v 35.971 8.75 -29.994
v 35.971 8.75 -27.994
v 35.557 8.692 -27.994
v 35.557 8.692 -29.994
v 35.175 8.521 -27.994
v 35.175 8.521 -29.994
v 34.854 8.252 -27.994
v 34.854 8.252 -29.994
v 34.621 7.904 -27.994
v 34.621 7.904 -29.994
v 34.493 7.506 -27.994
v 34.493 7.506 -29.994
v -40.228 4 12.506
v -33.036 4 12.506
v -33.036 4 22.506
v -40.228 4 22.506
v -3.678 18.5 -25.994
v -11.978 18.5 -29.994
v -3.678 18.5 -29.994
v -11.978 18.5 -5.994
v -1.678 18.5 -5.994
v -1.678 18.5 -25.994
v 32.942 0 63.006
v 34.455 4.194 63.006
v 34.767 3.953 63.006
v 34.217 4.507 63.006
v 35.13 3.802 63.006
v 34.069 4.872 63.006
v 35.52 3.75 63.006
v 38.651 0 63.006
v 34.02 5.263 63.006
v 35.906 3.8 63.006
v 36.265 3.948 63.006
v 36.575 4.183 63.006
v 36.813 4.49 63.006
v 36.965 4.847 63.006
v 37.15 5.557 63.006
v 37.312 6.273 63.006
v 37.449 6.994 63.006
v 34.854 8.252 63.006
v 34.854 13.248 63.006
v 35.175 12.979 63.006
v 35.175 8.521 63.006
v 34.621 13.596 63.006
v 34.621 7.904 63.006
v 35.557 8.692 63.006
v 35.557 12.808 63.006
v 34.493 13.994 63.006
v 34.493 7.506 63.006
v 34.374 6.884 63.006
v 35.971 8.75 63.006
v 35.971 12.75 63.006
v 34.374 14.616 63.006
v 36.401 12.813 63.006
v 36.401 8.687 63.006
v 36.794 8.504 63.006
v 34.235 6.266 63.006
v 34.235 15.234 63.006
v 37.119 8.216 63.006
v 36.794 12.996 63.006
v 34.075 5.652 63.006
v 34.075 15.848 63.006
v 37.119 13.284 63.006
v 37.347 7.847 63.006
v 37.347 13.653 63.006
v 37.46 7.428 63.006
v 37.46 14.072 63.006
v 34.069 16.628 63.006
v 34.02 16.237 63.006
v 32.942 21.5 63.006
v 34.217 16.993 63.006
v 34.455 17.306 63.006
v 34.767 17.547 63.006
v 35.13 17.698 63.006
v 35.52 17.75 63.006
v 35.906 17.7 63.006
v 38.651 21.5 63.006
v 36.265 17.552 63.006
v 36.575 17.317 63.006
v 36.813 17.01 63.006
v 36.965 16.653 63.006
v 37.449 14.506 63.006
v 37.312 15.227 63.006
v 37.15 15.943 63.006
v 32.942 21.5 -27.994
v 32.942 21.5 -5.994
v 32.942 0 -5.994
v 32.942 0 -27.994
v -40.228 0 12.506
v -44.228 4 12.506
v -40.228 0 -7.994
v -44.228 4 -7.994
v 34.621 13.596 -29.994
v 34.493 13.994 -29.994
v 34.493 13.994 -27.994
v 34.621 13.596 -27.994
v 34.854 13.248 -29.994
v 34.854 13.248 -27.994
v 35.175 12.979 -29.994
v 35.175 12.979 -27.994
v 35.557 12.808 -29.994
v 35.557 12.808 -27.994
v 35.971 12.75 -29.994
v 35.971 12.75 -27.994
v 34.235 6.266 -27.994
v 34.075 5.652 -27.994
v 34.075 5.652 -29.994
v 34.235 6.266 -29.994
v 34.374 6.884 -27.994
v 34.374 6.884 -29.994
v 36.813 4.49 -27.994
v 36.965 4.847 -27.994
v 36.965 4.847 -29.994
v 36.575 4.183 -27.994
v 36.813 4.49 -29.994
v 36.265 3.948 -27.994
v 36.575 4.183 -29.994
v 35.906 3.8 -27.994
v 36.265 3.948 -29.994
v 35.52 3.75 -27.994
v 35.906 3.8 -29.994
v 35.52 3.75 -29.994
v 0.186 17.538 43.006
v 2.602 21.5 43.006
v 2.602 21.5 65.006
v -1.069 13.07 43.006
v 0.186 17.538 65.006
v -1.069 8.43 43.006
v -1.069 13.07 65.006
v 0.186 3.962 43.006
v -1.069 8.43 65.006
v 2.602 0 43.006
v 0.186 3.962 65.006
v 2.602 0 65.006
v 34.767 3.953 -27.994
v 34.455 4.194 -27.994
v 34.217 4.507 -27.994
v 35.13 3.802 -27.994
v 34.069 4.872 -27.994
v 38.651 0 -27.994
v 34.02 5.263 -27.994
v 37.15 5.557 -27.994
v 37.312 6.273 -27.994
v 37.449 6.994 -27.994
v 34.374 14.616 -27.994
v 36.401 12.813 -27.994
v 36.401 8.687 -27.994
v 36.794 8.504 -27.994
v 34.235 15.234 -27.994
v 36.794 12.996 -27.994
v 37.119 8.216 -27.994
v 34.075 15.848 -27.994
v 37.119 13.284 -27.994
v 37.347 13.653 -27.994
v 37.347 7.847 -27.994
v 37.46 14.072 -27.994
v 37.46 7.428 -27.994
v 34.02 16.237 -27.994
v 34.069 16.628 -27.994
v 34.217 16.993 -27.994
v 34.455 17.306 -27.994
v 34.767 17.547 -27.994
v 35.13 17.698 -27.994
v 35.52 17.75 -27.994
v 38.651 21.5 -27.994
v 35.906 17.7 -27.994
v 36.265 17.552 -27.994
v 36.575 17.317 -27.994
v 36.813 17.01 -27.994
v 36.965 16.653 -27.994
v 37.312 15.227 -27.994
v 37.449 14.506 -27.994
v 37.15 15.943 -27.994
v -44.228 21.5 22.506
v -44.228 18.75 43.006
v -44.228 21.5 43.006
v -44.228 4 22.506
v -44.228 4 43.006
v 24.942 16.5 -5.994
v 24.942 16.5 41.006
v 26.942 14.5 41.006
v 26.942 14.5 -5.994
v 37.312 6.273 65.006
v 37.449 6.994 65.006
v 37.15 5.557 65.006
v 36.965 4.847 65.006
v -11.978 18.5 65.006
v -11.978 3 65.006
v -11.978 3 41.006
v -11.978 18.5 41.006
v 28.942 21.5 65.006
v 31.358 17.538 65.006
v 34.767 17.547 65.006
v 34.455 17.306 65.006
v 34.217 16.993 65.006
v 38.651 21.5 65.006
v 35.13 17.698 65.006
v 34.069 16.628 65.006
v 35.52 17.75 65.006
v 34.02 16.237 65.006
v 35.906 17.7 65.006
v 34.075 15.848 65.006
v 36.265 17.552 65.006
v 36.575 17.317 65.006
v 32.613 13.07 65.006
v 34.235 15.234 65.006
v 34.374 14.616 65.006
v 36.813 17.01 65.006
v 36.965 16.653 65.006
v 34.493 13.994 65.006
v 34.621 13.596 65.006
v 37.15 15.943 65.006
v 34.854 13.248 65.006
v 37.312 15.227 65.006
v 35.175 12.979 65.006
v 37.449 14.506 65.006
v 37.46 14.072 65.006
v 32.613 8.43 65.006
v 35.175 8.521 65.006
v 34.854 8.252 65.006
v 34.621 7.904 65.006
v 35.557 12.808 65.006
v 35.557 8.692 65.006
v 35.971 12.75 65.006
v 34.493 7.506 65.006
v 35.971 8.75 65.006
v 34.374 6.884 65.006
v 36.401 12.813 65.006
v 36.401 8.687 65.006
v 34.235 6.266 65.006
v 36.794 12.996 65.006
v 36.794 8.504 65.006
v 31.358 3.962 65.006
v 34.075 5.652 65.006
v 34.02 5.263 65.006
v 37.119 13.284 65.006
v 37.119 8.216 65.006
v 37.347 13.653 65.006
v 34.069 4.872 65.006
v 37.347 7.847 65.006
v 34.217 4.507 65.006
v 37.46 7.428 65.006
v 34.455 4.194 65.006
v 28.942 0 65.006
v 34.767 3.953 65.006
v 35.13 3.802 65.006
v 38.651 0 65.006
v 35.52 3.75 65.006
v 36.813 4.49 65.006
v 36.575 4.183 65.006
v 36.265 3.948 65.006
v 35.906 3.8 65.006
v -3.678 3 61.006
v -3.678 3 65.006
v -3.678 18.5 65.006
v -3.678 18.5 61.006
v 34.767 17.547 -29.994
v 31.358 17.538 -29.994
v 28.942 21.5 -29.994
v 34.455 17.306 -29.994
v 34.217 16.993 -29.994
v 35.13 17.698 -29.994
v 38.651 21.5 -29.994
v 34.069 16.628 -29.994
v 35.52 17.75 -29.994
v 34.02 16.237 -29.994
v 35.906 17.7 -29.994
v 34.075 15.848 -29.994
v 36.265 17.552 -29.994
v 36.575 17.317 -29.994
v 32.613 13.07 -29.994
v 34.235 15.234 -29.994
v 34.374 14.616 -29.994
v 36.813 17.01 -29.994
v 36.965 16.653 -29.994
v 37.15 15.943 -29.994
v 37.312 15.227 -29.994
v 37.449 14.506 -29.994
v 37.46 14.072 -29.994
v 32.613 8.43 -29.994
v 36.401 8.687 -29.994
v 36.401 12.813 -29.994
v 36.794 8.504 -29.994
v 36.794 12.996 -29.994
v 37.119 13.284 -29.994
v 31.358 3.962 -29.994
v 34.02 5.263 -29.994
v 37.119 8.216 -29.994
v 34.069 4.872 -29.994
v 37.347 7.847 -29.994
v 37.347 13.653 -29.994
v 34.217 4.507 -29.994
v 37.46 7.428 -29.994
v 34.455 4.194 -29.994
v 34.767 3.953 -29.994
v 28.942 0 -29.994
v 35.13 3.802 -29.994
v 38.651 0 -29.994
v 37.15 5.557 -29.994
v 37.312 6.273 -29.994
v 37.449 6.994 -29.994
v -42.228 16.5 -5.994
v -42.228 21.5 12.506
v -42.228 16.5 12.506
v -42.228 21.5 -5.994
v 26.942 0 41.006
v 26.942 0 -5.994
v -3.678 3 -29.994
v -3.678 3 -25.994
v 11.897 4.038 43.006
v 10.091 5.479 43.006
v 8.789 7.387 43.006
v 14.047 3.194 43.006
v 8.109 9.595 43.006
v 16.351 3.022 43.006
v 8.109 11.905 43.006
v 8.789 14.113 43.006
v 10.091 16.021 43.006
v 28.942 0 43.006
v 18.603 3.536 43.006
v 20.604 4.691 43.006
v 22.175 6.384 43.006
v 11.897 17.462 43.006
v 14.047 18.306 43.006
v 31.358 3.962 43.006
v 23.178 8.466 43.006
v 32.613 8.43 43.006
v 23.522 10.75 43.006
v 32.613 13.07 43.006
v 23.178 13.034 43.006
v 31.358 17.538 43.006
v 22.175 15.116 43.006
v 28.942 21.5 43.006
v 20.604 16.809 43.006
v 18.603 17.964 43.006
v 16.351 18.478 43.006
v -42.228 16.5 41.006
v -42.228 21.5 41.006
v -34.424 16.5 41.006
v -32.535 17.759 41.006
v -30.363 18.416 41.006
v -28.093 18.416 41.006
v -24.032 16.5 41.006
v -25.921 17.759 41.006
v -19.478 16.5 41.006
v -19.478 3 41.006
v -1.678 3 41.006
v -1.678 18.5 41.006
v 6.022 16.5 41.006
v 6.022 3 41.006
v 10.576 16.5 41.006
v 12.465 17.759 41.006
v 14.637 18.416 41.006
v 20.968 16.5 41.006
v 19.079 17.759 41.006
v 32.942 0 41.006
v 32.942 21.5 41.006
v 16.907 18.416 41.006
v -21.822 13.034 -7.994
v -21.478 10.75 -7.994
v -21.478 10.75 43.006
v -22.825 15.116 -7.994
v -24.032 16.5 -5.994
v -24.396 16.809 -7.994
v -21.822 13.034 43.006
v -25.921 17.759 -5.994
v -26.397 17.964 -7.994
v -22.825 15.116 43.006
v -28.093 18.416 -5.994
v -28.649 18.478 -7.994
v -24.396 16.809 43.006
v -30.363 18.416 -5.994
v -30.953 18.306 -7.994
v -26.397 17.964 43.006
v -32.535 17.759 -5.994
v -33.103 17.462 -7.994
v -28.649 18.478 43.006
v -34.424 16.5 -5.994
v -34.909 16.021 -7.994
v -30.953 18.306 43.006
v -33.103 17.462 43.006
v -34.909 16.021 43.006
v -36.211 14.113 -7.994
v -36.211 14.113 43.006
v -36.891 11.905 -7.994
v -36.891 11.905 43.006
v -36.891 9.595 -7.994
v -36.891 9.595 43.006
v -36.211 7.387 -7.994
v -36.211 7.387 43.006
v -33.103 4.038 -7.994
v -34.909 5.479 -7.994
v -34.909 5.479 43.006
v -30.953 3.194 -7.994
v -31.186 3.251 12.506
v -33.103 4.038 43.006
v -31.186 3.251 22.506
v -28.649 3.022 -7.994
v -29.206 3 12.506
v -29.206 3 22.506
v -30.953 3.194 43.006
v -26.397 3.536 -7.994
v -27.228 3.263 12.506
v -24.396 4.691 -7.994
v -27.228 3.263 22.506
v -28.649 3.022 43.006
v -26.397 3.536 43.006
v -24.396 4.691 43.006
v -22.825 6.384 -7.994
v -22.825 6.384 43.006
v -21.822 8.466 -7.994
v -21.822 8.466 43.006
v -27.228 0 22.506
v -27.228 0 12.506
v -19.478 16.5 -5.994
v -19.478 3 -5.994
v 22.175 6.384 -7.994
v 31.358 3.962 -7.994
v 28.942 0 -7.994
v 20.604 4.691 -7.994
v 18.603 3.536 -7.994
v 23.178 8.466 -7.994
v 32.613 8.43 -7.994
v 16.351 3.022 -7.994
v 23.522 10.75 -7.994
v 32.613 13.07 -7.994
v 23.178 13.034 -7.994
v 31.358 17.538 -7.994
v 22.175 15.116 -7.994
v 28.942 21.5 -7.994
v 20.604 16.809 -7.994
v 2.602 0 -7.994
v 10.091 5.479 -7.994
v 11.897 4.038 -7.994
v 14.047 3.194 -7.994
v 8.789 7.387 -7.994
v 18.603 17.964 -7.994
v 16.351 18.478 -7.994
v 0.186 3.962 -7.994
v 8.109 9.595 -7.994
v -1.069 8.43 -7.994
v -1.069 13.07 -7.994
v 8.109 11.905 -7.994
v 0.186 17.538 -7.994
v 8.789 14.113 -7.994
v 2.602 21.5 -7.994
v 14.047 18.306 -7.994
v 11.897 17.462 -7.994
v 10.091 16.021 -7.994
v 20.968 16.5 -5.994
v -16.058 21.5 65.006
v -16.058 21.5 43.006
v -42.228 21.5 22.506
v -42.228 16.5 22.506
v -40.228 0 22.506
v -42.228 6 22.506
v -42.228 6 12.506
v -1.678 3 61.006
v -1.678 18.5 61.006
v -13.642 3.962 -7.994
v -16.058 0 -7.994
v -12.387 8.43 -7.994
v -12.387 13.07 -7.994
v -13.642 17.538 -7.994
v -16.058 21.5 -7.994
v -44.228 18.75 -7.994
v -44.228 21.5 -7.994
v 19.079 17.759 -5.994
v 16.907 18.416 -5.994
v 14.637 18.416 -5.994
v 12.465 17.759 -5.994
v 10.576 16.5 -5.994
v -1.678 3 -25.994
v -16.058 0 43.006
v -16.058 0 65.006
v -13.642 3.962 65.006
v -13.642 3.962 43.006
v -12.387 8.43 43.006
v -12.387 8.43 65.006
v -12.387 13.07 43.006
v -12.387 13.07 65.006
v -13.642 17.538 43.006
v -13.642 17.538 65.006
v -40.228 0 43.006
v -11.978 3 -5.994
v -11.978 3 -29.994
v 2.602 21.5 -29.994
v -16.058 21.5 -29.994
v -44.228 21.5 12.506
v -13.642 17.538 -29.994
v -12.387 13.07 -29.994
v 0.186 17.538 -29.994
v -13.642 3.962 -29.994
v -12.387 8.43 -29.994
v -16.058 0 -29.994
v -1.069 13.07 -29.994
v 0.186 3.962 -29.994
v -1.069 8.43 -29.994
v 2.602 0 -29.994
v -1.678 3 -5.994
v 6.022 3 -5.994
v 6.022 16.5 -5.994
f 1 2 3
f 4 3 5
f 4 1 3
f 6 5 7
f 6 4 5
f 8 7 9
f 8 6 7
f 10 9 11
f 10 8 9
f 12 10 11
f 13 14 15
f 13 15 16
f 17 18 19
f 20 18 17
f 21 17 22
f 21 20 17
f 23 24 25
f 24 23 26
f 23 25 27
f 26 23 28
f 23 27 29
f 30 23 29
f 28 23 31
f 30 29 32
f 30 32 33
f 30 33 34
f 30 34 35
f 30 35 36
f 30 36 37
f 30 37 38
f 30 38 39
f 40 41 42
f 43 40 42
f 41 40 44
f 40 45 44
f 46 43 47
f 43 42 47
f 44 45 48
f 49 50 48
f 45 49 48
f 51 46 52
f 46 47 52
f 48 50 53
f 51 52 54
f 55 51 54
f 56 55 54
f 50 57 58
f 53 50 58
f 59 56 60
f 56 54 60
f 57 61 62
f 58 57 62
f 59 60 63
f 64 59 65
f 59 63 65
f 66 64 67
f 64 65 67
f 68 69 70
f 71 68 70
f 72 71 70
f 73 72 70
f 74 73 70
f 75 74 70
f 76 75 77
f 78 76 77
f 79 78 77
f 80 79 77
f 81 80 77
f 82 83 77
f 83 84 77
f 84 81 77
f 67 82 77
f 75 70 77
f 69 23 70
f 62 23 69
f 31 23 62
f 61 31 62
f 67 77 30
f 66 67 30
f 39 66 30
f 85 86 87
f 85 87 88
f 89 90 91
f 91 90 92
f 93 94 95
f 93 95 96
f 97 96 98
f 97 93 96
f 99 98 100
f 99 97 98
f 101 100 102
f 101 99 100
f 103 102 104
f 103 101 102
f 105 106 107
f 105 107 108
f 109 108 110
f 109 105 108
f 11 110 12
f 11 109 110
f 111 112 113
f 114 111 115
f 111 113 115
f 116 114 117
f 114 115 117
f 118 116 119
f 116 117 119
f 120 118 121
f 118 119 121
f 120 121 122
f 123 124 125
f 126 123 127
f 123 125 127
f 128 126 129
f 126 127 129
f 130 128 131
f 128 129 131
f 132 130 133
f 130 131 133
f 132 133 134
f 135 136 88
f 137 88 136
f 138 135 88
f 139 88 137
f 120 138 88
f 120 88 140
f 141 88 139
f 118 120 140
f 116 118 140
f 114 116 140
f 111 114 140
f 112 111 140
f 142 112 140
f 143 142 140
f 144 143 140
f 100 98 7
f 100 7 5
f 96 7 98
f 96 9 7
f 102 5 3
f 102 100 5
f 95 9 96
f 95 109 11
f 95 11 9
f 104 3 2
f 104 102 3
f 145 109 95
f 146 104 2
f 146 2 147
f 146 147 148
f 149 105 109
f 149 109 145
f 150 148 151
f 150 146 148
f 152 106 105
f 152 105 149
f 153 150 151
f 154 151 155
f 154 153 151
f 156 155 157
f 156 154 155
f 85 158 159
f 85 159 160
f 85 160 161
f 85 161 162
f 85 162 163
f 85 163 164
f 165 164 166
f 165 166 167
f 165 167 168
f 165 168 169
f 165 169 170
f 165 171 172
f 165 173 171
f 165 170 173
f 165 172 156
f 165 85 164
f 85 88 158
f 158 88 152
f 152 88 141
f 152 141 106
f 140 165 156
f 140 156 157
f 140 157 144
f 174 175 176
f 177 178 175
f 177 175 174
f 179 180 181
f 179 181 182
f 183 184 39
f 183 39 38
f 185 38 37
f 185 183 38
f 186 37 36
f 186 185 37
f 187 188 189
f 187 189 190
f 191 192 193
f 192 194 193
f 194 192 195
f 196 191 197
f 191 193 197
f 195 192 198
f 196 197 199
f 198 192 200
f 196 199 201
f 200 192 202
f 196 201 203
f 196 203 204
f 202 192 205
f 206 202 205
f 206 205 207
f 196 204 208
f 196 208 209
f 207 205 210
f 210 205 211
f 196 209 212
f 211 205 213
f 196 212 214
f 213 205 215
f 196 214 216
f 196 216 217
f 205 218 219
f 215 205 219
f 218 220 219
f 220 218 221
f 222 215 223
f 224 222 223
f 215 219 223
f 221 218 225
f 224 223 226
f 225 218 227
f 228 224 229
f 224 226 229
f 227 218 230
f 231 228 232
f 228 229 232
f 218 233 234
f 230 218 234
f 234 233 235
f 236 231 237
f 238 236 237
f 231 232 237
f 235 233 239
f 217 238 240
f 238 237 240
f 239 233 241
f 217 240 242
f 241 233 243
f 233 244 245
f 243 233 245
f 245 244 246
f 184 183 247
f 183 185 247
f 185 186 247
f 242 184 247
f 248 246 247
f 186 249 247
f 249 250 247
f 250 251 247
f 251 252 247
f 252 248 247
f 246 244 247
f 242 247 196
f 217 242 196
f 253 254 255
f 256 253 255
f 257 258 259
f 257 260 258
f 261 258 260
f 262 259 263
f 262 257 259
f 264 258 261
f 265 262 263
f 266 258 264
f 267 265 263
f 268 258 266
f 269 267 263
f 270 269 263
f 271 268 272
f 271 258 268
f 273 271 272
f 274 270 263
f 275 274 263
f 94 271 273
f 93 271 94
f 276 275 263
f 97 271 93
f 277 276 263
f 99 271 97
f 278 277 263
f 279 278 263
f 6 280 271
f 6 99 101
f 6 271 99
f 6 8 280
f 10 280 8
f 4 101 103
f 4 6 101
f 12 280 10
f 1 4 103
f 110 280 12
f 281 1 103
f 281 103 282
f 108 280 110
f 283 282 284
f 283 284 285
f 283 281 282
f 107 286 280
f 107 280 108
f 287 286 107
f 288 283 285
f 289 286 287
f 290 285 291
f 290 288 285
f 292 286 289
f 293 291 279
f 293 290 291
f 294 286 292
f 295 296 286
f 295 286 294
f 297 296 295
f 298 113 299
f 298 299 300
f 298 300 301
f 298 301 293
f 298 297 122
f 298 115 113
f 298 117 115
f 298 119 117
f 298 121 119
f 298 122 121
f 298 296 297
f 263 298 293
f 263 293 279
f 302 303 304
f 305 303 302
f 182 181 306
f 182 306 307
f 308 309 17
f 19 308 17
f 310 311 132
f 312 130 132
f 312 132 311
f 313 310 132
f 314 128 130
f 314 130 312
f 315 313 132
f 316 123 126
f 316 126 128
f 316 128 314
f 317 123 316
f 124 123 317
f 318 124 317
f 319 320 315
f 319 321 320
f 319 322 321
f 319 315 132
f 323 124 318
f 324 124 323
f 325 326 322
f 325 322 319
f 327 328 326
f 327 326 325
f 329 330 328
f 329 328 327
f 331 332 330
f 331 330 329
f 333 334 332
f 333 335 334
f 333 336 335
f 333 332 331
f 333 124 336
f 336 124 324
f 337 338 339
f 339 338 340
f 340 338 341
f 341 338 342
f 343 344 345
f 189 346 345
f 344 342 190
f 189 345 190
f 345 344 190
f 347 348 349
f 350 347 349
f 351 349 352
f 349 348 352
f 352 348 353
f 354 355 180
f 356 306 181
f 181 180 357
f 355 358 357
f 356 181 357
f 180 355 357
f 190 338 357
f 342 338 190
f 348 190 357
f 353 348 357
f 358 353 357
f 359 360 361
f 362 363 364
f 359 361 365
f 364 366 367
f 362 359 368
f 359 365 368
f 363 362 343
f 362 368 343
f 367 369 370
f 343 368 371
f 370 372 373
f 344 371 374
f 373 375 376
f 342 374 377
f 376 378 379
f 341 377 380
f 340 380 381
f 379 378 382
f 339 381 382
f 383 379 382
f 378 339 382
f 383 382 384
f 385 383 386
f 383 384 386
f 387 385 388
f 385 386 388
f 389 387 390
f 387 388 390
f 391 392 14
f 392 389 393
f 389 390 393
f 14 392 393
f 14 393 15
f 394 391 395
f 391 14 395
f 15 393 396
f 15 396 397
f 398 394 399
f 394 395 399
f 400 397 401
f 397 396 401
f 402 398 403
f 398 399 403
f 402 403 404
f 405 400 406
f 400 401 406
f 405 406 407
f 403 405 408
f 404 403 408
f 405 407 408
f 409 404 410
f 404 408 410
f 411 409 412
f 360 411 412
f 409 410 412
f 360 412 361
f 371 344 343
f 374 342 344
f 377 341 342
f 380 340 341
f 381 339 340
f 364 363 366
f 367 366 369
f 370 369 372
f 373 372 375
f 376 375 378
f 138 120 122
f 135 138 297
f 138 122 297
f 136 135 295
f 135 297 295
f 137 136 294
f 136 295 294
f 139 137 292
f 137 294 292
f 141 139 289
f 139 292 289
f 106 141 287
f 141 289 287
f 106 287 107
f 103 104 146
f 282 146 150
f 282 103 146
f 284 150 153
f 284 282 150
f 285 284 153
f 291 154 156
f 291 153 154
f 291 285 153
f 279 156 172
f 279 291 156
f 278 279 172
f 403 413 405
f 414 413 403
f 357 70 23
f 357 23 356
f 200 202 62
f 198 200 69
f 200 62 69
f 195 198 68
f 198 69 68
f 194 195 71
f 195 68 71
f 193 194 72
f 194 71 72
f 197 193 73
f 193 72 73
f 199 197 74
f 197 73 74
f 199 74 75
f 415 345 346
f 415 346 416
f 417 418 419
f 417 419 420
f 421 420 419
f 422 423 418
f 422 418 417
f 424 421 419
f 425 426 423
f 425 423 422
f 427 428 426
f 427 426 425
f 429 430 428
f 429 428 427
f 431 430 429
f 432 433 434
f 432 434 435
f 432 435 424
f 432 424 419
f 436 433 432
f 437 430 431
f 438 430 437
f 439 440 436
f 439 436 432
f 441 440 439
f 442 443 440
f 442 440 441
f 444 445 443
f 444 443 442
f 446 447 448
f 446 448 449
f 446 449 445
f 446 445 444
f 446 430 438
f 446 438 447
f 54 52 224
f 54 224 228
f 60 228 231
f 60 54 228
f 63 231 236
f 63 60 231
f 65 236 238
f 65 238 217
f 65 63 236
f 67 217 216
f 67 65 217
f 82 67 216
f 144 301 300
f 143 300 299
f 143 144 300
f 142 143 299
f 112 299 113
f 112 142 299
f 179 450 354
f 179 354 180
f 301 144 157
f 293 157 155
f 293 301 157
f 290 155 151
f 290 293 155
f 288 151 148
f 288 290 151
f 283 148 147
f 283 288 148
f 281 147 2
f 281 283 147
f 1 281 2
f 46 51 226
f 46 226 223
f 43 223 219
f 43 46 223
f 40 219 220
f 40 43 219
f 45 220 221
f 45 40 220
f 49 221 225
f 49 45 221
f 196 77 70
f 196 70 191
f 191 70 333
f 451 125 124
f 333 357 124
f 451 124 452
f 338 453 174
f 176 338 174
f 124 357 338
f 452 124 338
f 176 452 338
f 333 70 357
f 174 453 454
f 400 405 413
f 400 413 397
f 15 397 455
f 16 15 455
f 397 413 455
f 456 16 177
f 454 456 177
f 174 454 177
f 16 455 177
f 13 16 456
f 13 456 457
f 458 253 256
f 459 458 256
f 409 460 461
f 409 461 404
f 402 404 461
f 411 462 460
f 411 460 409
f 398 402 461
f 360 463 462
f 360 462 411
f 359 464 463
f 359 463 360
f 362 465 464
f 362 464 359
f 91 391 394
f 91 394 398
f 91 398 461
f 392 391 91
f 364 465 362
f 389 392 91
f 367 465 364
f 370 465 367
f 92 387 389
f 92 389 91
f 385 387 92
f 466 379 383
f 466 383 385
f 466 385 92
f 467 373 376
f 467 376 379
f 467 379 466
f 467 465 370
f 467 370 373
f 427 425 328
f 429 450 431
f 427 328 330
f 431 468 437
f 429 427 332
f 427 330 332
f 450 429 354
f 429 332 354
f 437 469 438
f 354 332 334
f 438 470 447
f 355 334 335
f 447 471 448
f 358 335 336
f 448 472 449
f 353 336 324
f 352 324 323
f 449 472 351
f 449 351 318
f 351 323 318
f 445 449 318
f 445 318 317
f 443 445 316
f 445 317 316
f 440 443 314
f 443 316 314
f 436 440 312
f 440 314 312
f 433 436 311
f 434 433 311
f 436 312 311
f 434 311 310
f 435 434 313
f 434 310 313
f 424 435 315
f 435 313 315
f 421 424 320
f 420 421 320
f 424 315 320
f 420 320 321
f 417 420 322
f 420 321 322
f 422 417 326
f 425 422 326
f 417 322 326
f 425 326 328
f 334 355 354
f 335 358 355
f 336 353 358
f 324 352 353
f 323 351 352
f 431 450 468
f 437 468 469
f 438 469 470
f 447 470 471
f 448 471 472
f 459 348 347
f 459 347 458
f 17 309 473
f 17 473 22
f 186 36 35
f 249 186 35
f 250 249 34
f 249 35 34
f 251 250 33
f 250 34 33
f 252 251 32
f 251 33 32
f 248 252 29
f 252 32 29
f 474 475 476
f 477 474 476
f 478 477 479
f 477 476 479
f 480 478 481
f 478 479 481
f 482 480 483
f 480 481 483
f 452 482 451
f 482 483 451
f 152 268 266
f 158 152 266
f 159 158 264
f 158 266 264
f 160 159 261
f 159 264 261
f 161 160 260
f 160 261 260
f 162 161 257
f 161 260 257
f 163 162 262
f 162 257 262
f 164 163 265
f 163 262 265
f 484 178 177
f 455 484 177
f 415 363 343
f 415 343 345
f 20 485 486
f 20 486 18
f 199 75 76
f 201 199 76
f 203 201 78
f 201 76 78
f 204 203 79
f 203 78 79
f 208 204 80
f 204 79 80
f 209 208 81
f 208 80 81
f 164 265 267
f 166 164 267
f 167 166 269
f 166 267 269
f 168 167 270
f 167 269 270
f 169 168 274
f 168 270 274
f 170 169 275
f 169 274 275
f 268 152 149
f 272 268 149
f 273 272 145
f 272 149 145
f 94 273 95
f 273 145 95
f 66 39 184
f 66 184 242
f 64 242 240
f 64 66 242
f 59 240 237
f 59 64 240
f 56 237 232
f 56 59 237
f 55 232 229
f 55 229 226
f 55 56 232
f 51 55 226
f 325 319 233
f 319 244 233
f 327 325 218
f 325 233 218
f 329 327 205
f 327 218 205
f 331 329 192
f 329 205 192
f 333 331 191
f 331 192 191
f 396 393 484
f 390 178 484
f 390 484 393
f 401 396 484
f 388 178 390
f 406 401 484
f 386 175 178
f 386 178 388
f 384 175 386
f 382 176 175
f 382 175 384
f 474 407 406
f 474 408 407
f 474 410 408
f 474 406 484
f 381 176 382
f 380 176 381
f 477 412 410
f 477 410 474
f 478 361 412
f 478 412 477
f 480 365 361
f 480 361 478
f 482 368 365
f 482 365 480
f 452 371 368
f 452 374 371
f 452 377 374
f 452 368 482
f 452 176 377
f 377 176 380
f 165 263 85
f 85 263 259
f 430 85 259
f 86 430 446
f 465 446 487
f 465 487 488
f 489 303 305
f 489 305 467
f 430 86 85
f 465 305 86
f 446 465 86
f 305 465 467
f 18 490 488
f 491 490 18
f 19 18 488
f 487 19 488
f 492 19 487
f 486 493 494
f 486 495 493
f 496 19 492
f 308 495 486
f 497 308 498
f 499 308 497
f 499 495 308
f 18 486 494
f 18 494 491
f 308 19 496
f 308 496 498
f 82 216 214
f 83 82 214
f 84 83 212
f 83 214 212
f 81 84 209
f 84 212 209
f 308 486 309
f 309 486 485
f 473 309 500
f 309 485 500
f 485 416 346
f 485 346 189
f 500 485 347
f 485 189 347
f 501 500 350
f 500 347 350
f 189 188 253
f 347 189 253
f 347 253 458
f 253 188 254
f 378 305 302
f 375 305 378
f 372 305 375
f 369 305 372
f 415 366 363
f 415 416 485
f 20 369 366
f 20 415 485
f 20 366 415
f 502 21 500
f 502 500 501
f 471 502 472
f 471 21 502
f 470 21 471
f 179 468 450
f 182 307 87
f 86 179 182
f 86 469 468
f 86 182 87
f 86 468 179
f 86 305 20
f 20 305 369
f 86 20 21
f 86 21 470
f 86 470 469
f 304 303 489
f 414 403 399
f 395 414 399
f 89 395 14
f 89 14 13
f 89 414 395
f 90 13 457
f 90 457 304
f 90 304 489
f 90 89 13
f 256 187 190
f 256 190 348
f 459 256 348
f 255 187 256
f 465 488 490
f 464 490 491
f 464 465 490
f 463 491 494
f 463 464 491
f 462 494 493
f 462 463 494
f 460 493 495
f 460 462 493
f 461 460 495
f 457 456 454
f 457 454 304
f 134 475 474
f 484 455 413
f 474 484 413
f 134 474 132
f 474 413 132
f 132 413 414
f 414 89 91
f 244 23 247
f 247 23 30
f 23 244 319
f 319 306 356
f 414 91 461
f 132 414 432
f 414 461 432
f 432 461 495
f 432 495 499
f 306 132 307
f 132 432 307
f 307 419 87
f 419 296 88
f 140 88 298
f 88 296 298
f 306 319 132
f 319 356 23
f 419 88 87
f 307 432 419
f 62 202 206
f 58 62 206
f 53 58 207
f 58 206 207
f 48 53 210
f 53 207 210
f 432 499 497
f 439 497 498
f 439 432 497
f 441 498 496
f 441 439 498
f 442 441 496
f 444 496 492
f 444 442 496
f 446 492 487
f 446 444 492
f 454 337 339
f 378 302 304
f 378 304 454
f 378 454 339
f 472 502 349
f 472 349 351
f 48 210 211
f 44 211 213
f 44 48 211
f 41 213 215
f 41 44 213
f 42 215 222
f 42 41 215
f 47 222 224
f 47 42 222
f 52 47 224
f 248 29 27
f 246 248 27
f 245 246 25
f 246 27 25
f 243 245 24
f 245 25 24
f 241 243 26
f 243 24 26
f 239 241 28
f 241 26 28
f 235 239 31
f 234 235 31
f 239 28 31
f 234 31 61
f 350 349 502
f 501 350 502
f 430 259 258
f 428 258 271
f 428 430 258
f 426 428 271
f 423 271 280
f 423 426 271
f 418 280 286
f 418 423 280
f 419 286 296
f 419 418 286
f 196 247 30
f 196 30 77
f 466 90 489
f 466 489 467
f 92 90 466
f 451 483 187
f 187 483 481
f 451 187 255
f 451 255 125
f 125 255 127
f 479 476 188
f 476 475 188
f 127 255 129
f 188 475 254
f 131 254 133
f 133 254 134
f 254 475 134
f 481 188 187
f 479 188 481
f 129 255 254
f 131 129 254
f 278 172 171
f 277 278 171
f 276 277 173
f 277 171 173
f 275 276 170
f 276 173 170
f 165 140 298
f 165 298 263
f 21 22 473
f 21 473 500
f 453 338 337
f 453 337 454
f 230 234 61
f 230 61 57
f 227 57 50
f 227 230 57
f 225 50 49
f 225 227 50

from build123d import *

# Parameters (mm, degrees)
SKETCH1_W           = 95
SKETCH1_H           = 95
BOSS_EXTRUDE1_DEPTH = 25
SKETCH2_R           = 7.75
CUT_EXTRUDE2_DEPTH  = 100
SKETCH3_R           = 17
CUT_EXTRUDE3_DEPTH  = 22
CUT_EXTRUDE4_START  = -22
SKETCH4_R           = 17
CUT_EXTRUDE4_DEPTH  = 22
SKETCH5_W           = 6.246993927
SKETCH5_H           = 25
CUT_EXTRUDE5_DEPTH  = 22
SKETCH6_W           = 7.178723585
SKETCH6_H           = 25
CUT_EXTRUDE6_DEPTH  = 22
SKETCH8_W           = 99.503929421
SKETCH8_H           = 3.5
CUT_EXTRUDE7_DEPTH  = 100
SKETCH9_W           = 8.3
SKETCH9_H           = 15.5
CUT_EXTRUDE11_DEPTH = 100
SKETCH13_W          = 87
SKETCH13_H          = 15.5
CUT_EXTRUDE12_DEPTH = 2
SKETCH14_W          = 25.5
SKETCH14_H          = 47
CUT_EXTRUDE14_DEPTH = 18.5
SKETCH16_W          = 24.75
SKETCH16_H          = 47
CUT_EXTRUDE15_DEPTH = 5
SKETCH17_W          = 20.919567191
SKETCH17_H          = 47
CUT_EXTRUDE16_DEPTH = 5
CUT_EXTRUDE17_DEPTH = 100
FILLET6_R           = 1.5
FILLET7_R           = 1.5
FILLET8_R           = 1.5
FILLET9_R           = 1.5
SKETCH19_W          = 12.12120401
SKETCH19_H          = 21.5
CUT_EXTRUDE20_DEPTH = 100
SKETCH20_W          = 5.709228799
SKETCH20_H          = 91
CUT_EXTRUDE23_DEPTH = 100
SKETCH21_W          = 6
SKETCH21_H          = 47
CUT_EXTRUDE26_DEPTH = 40
CHAMFER1_SIZE       = 2
SKETCH22_W          = 15
SKETCH22_H          = 10
CUT_EXTRUDE27_DEPTH = 4
SKETCH23_W          = 2
SKETCH23_H          = 10
CUT_EXTRUDE28_DEPTH = 54
CHAMFER2_SIZE       = 2
CHAMFER3_SIZE       = 4
CHAMFER4_SIZE       = 4


with BuildPart() as part:
    # Sketch1 → Boss-Extrude1 (new body)
    with BuildSketch(Plane(origin=(0, 0, 0), x_dir=(1, 0, 0), z_dir=(0, 1, 0))):
        with Locations((3.271948822, -17.506298191)):
            Rectangle(SKETCH1_W, SKETCH1_H)
    extrude(amount=BOSS_EXTRUDE1_DEPTH)

    # Sketch2 → Cut-Extrude2 (cut)
    with BuildSketch(Plane.XY.offset(65.006298191)):
        with Locations((-29.228051178, 10.75)):
            Circle(SKETCH2_R)
        with Locations((15.771948822, 10.75)):
            Circle(SKETCH2_R)
    extrude(amount=-CUT_EXTRUDE2_DEPTH, mode=Mode.SUBTRACT)

    # Sketch3 → Cut-Extrude3 (cut)
    with BuildSketch(Plane.XY.offset(65.006298191)):
        with Locations((-29.228051178, 10.75)):
            Circle(SKETCH3_R)
        with Locations((15.771948822, 10.75)):
            Circle(SKETCH3_R)
    extrude(amount=-CUT_EXTRUDE3_DEPTH, mode=Mode.SUBTRACT)

    # Sketch4 → Cut-Extrude4 (cut)
    with BuildSketch(Plane(origin=(0, 0, -29.993701809), x_dir=(-1, 0, 0), z_dir=(0, 0, -1)).offset(CUT_EXTRUDE4_START)):
        with Locations((-15.771948822, 10.75)):
            Circle(SKETCH4_R)
        with Locations((29.228051178, 10.75)):
            Circle(SKETCH4_R)
    extrude(amount=CUT_EXTRUDE4_DEPTH, mode=Mode.SUBTRACT)

    # Sketch5 → Cut-Extrude5 (cut)
    with BuildSketch(Plane.XY.offset(65.006298191)):
        with Locations((-41.104554214, 12.5)):
            Rectangle(SKETCH5_W, SKETCH5_H)
    extrude(amount=-CUT_EXTRUDE5_DEPTH, mode=Mode.SUBTRACT)

    # Sketch6 → Cut-Extrude6 (cut)
    with BuildSketch(Plane(origin=(0, 0, -29.993701809), x_dir=(-1, 0, 0), z_dir=(0, 0, -1))):
        with Locations((40.638689386, 12.5)):
            Rectangle(SKETCH6_W, SKETCH6_H)
    extrude(amount=-CUT_EXTRUDE6_DEPTH, mode=Mode.SUBTRACT)

    # Sketch8 → Cut-Extrude7 (cut)
    with BuildSketch(Plane(origin=(0, 0, -29.993701809), x_dir=(-1, 0, 0), z_dir=(0, 0, -1))):
        with Locations((-1.019984112, 23.25)):
            Rectangle(SKETCH8_W, SKETCH8_H)
    extrude(amount=-CUT_EXTRUDE7_DEPTH, mode=Mode.SUBTRACT)

    # Sketch9 → Cut-Extrude11 (cut)
    with BuildSketch(Plane.XY.offset(65.006298191)):
        with Locations((-7.828051178, 10.75)):
            Rectangle(SKETCH9_W, SKETCH9_H)
    extrude(amount=-CUT_EXTRUDE11_DEPTH, mode=Mode.SUBTRACT)

    # Sketch13 → Cut-Extrude12 (cut)
    with BuildSketch(Plane.ZY.offset(3.678051178)):
        with Locations((17.506298191, 10.75)):
            Rectangle(SKETCH13_W, SKETCH13_H)
    extrude(amount=-CUT_EXTRUDE12_DEPTH, mode=Mode.SUBTRACT)

    # Sketch14 → Cut-Extrude14 (cut)
    with BuildSketch(Plane(origin=(0, 21.5, 0), x_dir=(1, 0, 0), z_dir=(0, 1, 0))):
        with Locations((-6.728051178, -17.506298191)):
            Rectangle(SKETCH14_W, SKETCH14_H)
    extrude(amount=-CUT_EXTRUDE14_DEPTH, mode=Mode.SUBTRACT)

    # Sketch16 → Cut-Extrude15 (cut)
    with BuildSketch(Plane(origin=(0, 21.5, 0), x_dir=(1, 0, 0), z_dir=(0, 1, 0))):
        with Locations((-29.853051178, -17.506298191)):
            Rectangle(SKETCH16_W, SKETCH16_H)
    extrude(amount=-CUT_EXTRUDE15_DEPTH, mode=Mode.SUBTRACT)

    # Sketch17 → Cut-Extrude16 (cut)
    with BuildSketch(Plane(origin=(0, 21.5, 0), x_dir=(1, 0, 0), z_dir=(0, 1, 0))):
        with Locations((16.481732418, -17.506298191)):
            Rectangle(SKETCH17_W, SKETCH17_H)
    extrude(amount=-CUT_EXTRUDE16_DEPTH, mode=Mode.SUBTRACT)

    # Sketch18 → Cut-Extrude17 (cut)
    with BuildSketch(Plane.XY.offset(65.006298191)):
        with BuildLine():
            Line((34.66639245, 12.75), (37.680851122, 12.75))
            ThreePointArc((37.680851122, 12.75), (37.300376381, 15.28065192), (36.628602437, 17.75))
            Line((36.628602437, 17.75), (33.435470555, 17.75))
            ThreePointArc((33.435470555, 17.75), (34.221100776, 15.291893017), (34.66639245, 12.75))
        make_face()
        with BuildLine():
            Line((34.66639245, 8.75), (37.680851122, 8.75))
            ThreePointArc((37.680851122, 8.75), (37.300376381, 6.21934808), (36.628602437, 3.75))
            Line((36.628602437, 3.75), (33.435470555, 3.75))
            ThreePointArc((33.435470555, 3.75), (34.221100776, 6.208106983), (34.66639245, 8.75))
        make_face()
    extrude(amount=-CUT_EXTRUDE17_DEPTH, mode=Mode.SUBTRACT)

    # Fillet6
    fillet6_edges = [part.edges().sort_by_distance(p)[0] for p in [
        (33.435470555, 17.75, 17.506298191),
        (36.628602437, 17.75, 17.506298191),
    ]]
    fillet(fillet6_edges, radius=FILLET6_R - 0.0001)  # a hair under: the kernel refuses the full size

    # Fillet7
    fillet7_edges = [part.edges().sort_by_distance(p)[0] for p in [
        (37.680851122, 12.75, 17.506298191),
        (34.66639245, 12.75, 17.506298191),
    ]]
    fillet(fillet7_edges, radius=FILLET7_R - 0.0001)  # a hair under: the kernel refuses the full size

    # Fillet8
    fillet8_edges = [part.edges().sort_by_distance(p)[0] for p in [
        (33.435470555, 3.75, 17.506298191),
        (36.628602437, 3.75, 17.506298191),
    ]]
    fillet(fillet8_edges, radius=FILLET8_R - 0.0001)  # a hair under: the kernel refuses the full size

    # Fillet9
    fillet9_edges = [part.edges().sort_by_distance(p)[0] for p in [
        (37.680851122, 8.75, 17.506298191),
        (34.66639245, 8.75, 17.506298191),
    ]]
    fillet(fillet9_edges, radius=FILLET9_R - 0.0001)  # a hair under: the kernel refuses the full size

    # Sketch19 → Cut-Extrude20 (cut)
    with BuildSketch(Plane.XY.offset(65.006298191)):
        with Locations((44.711346817, 10.75)):
            Rectangle(SKETCH19_W, SKETCH19_H)
    extrude(amount=-CUT_EXTRUDE20_DEPTH, mode=Mode.SUBTRACT)

    # Sketch20 → Cut-Extrude23 (cut)
    with BuildSketch(Plane(origin=(0, 21.5, 0), x_dir=(1, 0, 0), z_dir=(0, 1, 0))):
        with Locations((35.796130413, -17.506298191)):
            Rectangle(SKETCH20_W, SKETCH20_H)
    extrude(amount=-CUT_EXTRUDE23_DEPTH, mode=Mode.SUBTRACT)

    # Sketch21 → Cut-Extrude26 (cut)
    with BuildSketch(Plane(origin=(0, 21.5, 0), x_dir=(1, 0, 0), z_dir=(0, 1, 0))):
        with Locations((29.941516013, -17.506298191)):
            Rectangle(SKETCH21_W, SKETCH21_H)
    extrude(amount=-CUT_EXTRUDE26_DEPTH, mode=Mode.SUBTRACT)

    # Chamfer1
    chamfer1_edges = [part.edges().sort_by_distance(p)[0] for p in [
        (26.941516013, 16.5, 17.506298191),
    ]]
    chamfer(chamfer1_edges, length=CHAMFER1_SIZE)

    # Sketch22 → Cut-Extrude27 (cut)
    with BuildSketch(Plane(origin=(0, 0, 0), x_dir=(-1, 0, 0), z_dir=(0, -1, 0))):
        with Locations((34.728051178, -17.506298191)):
            Rectangle(SKETCH22_W, SKETCH22_H)
    extrude(amount=-CUT_EXTRUDE27_DEPTH, mode=Mode.SUBTRACT)

    # Sketch23 → Cut-Extrude28 (cut)
    with BuildSketch(Plane(origin=(0, 0, 0), x_dir=(-1, 0, 0), z_dir=(0, -1, 0))):
        with Locations((43.228051178, -17.506298191)):
            Rectangle(SKETCH23_W, SKETCH23_H)
    extrude(amount=-CUT_EXTRUDE28_DEPTH, mode=Mode.SUBTRACT)

    # Chamfer2
    chamfer2_edges = [part.edges().sort_by_distance(p)[0] for p in [
        (-42.228051178, 4, 17.506298191),
    ]]
    chamfer(chamfer2_edges, length=CHAMFER2_SIZE)

    # Chamfer3
    chamfer3_edges = [part.edges().sort_by_distance(p)[0] for p in [
        (-44.228051178, 0, 2.256298191),
    ]]
    chamfer(chamfer3_edges, length=CHAMFER3_SIZE)

    # Chamfer4
    chamfer4_edges = [part.edges().sort_by_distance(p)[0] for p in [
        (-44.228051178, 0, 32.756298191),
    ]]
    chamfer(chamfer4_edges, length=CHAMFER4_SIZE)


solid = part.part
